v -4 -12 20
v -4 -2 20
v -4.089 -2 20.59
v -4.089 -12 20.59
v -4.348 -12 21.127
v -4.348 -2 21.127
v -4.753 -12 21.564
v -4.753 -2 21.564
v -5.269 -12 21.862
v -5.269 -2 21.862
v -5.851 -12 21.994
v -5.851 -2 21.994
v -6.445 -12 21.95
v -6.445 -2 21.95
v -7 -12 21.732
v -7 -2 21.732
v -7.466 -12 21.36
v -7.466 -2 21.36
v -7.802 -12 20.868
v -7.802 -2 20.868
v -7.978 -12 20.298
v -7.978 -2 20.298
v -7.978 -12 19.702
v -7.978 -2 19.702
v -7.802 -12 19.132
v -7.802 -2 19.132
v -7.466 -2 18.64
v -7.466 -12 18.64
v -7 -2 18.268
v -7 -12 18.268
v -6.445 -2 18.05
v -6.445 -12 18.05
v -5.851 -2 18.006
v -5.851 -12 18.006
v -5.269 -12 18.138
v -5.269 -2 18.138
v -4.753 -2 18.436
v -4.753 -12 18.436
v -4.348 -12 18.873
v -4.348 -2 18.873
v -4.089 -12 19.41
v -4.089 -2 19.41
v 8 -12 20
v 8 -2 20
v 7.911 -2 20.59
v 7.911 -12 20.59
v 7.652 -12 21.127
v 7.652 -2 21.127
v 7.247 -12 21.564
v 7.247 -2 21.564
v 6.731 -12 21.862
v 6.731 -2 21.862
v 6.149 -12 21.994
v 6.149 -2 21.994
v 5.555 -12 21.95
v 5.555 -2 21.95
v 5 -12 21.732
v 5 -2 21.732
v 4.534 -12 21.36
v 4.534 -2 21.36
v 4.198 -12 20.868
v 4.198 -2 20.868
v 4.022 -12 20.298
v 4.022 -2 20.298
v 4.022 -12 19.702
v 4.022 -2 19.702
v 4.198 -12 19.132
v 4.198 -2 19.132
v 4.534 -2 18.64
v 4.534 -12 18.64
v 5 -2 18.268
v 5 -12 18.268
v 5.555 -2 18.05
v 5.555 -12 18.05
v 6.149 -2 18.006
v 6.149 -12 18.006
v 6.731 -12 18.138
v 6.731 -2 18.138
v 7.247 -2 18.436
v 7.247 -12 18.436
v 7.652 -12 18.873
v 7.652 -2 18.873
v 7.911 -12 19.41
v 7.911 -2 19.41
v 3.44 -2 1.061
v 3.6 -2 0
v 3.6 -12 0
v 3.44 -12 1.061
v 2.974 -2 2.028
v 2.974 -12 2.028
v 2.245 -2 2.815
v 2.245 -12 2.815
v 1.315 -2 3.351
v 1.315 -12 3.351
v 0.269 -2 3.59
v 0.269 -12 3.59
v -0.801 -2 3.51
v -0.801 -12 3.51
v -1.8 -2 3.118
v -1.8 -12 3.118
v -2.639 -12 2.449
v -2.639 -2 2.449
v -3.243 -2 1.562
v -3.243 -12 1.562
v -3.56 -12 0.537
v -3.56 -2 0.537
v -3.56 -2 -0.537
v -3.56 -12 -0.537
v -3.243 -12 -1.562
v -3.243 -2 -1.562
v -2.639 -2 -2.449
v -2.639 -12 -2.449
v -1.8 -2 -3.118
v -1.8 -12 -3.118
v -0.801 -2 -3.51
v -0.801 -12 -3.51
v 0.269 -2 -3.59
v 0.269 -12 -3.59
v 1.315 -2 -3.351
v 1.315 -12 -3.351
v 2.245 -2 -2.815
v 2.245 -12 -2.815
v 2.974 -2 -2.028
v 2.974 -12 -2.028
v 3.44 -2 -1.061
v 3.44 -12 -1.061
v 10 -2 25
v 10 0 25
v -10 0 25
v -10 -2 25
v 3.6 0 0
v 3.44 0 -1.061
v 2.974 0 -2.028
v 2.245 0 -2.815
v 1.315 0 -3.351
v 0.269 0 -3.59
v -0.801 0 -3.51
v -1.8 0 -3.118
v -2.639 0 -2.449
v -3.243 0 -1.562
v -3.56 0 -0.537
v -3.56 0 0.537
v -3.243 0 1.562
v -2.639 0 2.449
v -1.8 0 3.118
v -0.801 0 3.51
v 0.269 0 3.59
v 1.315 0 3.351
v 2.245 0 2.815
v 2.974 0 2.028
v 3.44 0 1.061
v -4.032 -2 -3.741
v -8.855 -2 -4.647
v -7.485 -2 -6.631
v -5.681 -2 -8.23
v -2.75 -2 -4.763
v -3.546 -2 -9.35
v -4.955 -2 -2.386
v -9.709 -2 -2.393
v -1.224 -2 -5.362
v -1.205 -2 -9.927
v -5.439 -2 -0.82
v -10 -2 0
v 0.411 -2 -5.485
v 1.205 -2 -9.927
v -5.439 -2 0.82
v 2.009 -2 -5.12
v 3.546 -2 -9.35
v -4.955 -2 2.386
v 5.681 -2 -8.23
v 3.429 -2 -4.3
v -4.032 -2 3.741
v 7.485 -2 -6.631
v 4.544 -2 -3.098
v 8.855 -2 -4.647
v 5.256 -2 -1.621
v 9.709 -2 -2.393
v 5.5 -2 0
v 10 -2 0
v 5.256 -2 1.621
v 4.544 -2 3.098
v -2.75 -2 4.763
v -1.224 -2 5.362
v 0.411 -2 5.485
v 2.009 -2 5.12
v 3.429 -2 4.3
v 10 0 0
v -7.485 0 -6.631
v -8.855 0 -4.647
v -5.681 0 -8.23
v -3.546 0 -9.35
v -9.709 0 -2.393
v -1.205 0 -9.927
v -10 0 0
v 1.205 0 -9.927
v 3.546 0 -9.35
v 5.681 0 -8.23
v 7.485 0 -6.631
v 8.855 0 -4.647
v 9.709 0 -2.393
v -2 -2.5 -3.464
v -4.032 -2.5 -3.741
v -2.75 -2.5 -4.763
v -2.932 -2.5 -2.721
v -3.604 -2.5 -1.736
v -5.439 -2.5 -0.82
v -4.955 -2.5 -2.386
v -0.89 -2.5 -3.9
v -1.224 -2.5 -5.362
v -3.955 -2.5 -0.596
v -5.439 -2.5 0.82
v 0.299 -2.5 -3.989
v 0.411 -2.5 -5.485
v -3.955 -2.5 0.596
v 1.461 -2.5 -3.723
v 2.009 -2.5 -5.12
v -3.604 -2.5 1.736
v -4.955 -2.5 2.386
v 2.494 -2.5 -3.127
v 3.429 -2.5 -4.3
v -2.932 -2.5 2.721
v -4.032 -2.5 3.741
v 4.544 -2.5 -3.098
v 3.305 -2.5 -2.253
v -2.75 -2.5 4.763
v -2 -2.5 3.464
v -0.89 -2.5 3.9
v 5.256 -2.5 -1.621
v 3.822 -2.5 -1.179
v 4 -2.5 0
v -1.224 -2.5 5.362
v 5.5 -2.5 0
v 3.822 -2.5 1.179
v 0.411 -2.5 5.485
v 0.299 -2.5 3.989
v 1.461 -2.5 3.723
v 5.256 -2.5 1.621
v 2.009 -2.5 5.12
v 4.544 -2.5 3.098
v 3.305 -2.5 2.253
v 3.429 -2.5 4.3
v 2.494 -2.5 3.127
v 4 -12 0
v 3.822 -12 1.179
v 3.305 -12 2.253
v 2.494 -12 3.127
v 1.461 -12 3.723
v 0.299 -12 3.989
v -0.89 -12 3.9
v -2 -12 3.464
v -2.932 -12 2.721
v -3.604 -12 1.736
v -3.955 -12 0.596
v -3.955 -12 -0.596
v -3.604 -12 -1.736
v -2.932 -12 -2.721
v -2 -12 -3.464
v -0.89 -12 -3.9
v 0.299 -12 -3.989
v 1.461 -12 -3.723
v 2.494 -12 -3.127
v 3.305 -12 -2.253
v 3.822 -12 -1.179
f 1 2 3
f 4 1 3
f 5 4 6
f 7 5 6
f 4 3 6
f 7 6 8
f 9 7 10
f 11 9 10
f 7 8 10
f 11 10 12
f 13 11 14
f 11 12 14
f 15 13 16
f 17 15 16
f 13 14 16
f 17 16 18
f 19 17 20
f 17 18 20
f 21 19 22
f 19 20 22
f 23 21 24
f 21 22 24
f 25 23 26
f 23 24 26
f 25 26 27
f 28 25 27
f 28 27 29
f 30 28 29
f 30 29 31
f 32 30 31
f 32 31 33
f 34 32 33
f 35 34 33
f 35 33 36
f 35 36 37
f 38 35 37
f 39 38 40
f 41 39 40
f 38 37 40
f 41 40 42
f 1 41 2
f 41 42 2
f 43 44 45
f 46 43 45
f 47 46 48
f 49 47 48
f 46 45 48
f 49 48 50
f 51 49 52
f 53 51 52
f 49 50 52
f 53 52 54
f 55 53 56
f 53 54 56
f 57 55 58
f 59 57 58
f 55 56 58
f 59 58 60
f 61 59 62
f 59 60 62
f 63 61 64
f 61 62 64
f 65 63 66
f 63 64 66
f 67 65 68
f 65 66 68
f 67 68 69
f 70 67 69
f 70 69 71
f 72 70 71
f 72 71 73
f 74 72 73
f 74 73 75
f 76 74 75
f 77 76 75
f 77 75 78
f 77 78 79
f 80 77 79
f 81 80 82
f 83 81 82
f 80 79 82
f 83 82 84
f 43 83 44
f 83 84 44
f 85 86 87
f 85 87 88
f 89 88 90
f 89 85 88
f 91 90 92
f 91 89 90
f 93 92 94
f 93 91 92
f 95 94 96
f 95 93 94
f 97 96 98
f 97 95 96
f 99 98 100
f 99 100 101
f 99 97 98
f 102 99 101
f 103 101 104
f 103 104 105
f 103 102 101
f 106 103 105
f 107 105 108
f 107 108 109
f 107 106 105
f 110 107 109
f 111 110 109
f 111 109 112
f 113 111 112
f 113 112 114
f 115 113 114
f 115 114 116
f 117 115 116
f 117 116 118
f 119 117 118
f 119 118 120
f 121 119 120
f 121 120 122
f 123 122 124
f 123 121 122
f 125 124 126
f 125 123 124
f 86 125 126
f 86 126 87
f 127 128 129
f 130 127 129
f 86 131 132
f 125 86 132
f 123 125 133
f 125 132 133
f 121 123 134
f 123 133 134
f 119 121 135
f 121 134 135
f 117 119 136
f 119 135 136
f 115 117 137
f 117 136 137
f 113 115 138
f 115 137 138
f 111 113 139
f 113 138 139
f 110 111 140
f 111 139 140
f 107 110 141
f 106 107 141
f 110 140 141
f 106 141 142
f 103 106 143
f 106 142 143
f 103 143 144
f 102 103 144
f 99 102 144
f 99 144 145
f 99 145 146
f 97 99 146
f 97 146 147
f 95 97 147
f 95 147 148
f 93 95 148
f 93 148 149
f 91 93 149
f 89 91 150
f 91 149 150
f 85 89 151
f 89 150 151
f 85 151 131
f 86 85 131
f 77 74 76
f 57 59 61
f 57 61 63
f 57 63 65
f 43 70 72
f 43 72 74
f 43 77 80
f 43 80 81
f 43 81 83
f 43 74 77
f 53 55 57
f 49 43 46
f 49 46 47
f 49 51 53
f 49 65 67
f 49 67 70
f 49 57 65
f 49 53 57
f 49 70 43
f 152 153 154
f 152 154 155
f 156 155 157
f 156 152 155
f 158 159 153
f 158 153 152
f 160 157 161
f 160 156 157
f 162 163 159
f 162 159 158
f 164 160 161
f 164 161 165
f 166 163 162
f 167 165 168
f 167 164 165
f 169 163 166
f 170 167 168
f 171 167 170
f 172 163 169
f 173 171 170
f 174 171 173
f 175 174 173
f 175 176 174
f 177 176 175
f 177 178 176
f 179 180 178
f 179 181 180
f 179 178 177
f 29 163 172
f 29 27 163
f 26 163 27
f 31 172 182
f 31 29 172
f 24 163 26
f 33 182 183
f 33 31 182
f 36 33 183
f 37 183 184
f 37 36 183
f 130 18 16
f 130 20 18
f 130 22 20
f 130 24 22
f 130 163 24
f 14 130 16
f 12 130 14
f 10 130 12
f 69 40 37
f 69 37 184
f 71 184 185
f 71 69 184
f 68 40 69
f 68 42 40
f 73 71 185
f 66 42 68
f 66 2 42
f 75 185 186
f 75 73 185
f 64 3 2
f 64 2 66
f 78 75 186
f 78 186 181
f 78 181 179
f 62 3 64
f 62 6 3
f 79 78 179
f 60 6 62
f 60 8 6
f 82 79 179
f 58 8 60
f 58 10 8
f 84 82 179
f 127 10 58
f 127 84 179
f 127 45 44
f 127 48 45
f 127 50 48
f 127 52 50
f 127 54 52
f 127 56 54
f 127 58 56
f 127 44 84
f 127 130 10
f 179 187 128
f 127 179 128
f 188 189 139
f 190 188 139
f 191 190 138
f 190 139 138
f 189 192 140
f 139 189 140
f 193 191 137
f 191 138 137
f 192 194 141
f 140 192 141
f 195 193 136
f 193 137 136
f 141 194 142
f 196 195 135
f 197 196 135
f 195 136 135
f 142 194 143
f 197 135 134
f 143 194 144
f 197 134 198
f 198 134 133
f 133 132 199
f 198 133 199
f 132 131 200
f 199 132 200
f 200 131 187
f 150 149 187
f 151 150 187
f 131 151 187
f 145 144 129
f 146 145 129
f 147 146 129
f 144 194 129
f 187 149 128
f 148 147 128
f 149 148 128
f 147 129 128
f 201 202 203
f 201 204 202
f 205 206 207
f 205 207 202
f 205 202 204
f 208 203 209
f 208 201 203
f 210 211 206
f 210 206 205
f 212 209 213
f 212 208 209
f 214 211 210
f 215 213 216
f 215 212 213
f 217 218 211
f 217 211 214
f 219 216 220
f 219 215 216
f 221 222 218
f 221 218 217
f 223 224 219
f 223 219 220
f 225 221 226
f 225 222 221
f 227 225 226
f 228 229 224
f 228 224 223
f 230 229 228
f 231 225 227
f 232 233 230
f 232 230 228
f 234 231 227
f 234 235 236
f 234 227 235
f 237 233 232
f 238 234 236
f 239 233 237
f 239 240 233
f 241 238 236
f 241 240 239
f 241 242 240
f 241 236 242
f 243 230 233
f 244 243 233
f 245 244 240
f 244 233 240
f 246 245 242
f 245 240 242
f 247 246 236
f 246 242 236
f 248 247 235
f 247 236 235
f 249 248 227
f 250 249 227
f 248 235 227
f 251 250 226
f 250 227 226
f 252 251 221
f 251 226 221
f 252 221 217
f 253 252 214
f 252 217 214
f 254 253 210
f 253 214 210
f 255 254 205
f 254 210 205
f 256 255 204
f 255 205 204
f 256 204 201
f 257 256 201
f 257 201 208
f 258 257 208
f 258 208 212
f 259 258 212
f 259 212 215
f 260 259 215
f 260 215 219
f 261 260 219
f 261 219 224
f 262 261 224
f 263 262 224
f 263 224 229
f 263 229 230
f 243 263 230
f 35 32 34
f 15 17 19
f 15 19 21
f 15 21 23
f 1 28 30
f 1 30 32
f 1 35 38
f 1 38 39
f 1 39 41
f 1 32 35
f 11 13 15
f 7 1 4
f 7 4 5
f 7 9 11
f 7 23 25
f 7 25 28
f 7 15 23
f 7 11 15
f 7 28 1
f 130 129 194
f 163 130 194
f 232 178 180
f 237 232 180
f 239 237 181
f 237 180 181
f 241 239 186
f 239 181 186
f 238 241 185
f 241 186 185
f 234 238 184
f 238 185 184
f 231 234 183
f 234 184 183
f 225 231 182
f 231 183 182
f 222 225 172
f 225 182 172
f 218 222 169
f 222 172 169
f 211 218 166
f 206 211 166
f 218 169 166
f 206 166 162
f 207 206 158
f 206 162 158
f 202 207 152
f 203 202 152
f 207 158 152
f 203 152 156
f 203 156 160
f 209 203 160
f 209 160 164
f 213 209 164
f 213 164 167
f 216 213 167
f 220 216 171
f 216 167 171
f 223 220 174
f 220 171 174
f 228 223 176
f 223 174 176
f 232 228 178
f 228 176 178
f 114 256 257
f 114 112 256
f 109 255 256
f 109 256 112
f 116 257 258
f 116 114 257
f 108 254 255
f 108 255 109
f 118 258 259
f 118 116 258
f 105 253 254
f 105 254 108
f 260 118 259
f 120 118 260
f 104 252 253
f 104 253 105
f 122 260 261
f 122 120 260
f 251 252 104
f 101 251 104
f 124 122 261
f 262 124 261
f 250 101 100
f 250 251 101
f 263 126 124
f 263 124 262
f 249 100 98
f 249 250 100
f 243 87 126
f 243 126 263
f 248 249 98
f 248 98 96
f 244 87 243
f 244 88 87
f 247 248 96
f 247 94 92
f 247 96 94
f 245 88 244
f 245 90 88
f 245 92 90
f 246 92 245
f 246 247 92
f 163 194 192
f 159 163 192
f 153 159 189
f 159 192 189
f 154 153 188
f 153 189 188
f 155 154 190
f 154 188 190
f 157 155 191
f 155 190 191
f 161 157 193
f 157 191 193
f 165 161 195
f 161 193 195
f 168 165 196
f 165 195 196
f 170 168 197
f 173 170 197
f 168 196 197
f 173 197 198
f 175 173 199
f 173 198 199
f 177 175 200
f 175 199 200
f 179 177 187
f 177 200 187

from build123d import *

# Parameters (mm, degrees)
F1_DEPTH = 2
F2_R     = 4
F2_R_2   = 3.6
F3_DEPTH = 10
F4_R     = 2
F5_DEPTH = 10
F6_R     = 5.5
F6_R_2   = 4
F7_DEPTH = 0.5


with BuildPart() as f1:
    # F0 (on Front) → F1 (new body)
    with BuildSketch(Plane.XZ):
        with BuildLine():
            ThreePointArc((-10, 8.3066238629), (0, 13), (10, 8.3066238629))
            Line((10, 8.3066238629), (10, 25))
            Line((10, 25), (-10, 25))
            Line((-10, 25), (-10, 8.3066238629))
        make_face()
        with BuildLine():
            Line((10, 0), (10, 8.3066238629))
            ThreePointArc((10, 8.3066238629), (0, 13), (-10, 8.3066238629))
            Line((-10, 8.3066238629), (-10, 0))
            ThreePointArc((-10, 0), (0, 10), (10, 0))
        make_face()
        with BuildLine():
            Line((3.6, 0), (10, 0))
            ThreePointArc((10, 0), (0, 10), (-10, 0))
            Line((-10, 0), (-3.6, 0))
            ThreePointArc((-3.6, 0), (0, 3.6), (3.6, 0))
        make_face()
        with BuildLine():
            ThreePointArc((-10, 0), (0, -10), (10, 0))
            Line((10, 0), (3.6, 0))
            ThreePointArc((3.6, 0), (0, -3.6), (-3.6, 0))
            Line((-3.6, 0), (-10, 0))
        make_face()
    extrude(amount=F1_DEPTH)

    # F2 (on face) → F3 (join)
    with BuildSketch(Plane.XZ.offset(2)):
        Circle(F2_R)
        Circle(F2_R_2, mode=Mode.SUBTRACT)
    extrude(amount=F3_DEPTH)

    # F4 (on face) → F5 (join)
    with BuildSketch(Plane.XZ.offset(2)):
        with Locations((-6, 20)):
            Circle(F4_R)
        with Locations((6, 20)):
            Circle(F4_R)
    extrude(amount=F5_DEPTH)

    # F6 (on face) → F7 (join)
    with BuildSketch(Plane.XZ.offset(2)):
        Circle(F6_R)
        Circle(F6_R_2, mode=Mode.SUBTRACT)
    extrude(amount=F7_DEPTH)


solid = f1.part
